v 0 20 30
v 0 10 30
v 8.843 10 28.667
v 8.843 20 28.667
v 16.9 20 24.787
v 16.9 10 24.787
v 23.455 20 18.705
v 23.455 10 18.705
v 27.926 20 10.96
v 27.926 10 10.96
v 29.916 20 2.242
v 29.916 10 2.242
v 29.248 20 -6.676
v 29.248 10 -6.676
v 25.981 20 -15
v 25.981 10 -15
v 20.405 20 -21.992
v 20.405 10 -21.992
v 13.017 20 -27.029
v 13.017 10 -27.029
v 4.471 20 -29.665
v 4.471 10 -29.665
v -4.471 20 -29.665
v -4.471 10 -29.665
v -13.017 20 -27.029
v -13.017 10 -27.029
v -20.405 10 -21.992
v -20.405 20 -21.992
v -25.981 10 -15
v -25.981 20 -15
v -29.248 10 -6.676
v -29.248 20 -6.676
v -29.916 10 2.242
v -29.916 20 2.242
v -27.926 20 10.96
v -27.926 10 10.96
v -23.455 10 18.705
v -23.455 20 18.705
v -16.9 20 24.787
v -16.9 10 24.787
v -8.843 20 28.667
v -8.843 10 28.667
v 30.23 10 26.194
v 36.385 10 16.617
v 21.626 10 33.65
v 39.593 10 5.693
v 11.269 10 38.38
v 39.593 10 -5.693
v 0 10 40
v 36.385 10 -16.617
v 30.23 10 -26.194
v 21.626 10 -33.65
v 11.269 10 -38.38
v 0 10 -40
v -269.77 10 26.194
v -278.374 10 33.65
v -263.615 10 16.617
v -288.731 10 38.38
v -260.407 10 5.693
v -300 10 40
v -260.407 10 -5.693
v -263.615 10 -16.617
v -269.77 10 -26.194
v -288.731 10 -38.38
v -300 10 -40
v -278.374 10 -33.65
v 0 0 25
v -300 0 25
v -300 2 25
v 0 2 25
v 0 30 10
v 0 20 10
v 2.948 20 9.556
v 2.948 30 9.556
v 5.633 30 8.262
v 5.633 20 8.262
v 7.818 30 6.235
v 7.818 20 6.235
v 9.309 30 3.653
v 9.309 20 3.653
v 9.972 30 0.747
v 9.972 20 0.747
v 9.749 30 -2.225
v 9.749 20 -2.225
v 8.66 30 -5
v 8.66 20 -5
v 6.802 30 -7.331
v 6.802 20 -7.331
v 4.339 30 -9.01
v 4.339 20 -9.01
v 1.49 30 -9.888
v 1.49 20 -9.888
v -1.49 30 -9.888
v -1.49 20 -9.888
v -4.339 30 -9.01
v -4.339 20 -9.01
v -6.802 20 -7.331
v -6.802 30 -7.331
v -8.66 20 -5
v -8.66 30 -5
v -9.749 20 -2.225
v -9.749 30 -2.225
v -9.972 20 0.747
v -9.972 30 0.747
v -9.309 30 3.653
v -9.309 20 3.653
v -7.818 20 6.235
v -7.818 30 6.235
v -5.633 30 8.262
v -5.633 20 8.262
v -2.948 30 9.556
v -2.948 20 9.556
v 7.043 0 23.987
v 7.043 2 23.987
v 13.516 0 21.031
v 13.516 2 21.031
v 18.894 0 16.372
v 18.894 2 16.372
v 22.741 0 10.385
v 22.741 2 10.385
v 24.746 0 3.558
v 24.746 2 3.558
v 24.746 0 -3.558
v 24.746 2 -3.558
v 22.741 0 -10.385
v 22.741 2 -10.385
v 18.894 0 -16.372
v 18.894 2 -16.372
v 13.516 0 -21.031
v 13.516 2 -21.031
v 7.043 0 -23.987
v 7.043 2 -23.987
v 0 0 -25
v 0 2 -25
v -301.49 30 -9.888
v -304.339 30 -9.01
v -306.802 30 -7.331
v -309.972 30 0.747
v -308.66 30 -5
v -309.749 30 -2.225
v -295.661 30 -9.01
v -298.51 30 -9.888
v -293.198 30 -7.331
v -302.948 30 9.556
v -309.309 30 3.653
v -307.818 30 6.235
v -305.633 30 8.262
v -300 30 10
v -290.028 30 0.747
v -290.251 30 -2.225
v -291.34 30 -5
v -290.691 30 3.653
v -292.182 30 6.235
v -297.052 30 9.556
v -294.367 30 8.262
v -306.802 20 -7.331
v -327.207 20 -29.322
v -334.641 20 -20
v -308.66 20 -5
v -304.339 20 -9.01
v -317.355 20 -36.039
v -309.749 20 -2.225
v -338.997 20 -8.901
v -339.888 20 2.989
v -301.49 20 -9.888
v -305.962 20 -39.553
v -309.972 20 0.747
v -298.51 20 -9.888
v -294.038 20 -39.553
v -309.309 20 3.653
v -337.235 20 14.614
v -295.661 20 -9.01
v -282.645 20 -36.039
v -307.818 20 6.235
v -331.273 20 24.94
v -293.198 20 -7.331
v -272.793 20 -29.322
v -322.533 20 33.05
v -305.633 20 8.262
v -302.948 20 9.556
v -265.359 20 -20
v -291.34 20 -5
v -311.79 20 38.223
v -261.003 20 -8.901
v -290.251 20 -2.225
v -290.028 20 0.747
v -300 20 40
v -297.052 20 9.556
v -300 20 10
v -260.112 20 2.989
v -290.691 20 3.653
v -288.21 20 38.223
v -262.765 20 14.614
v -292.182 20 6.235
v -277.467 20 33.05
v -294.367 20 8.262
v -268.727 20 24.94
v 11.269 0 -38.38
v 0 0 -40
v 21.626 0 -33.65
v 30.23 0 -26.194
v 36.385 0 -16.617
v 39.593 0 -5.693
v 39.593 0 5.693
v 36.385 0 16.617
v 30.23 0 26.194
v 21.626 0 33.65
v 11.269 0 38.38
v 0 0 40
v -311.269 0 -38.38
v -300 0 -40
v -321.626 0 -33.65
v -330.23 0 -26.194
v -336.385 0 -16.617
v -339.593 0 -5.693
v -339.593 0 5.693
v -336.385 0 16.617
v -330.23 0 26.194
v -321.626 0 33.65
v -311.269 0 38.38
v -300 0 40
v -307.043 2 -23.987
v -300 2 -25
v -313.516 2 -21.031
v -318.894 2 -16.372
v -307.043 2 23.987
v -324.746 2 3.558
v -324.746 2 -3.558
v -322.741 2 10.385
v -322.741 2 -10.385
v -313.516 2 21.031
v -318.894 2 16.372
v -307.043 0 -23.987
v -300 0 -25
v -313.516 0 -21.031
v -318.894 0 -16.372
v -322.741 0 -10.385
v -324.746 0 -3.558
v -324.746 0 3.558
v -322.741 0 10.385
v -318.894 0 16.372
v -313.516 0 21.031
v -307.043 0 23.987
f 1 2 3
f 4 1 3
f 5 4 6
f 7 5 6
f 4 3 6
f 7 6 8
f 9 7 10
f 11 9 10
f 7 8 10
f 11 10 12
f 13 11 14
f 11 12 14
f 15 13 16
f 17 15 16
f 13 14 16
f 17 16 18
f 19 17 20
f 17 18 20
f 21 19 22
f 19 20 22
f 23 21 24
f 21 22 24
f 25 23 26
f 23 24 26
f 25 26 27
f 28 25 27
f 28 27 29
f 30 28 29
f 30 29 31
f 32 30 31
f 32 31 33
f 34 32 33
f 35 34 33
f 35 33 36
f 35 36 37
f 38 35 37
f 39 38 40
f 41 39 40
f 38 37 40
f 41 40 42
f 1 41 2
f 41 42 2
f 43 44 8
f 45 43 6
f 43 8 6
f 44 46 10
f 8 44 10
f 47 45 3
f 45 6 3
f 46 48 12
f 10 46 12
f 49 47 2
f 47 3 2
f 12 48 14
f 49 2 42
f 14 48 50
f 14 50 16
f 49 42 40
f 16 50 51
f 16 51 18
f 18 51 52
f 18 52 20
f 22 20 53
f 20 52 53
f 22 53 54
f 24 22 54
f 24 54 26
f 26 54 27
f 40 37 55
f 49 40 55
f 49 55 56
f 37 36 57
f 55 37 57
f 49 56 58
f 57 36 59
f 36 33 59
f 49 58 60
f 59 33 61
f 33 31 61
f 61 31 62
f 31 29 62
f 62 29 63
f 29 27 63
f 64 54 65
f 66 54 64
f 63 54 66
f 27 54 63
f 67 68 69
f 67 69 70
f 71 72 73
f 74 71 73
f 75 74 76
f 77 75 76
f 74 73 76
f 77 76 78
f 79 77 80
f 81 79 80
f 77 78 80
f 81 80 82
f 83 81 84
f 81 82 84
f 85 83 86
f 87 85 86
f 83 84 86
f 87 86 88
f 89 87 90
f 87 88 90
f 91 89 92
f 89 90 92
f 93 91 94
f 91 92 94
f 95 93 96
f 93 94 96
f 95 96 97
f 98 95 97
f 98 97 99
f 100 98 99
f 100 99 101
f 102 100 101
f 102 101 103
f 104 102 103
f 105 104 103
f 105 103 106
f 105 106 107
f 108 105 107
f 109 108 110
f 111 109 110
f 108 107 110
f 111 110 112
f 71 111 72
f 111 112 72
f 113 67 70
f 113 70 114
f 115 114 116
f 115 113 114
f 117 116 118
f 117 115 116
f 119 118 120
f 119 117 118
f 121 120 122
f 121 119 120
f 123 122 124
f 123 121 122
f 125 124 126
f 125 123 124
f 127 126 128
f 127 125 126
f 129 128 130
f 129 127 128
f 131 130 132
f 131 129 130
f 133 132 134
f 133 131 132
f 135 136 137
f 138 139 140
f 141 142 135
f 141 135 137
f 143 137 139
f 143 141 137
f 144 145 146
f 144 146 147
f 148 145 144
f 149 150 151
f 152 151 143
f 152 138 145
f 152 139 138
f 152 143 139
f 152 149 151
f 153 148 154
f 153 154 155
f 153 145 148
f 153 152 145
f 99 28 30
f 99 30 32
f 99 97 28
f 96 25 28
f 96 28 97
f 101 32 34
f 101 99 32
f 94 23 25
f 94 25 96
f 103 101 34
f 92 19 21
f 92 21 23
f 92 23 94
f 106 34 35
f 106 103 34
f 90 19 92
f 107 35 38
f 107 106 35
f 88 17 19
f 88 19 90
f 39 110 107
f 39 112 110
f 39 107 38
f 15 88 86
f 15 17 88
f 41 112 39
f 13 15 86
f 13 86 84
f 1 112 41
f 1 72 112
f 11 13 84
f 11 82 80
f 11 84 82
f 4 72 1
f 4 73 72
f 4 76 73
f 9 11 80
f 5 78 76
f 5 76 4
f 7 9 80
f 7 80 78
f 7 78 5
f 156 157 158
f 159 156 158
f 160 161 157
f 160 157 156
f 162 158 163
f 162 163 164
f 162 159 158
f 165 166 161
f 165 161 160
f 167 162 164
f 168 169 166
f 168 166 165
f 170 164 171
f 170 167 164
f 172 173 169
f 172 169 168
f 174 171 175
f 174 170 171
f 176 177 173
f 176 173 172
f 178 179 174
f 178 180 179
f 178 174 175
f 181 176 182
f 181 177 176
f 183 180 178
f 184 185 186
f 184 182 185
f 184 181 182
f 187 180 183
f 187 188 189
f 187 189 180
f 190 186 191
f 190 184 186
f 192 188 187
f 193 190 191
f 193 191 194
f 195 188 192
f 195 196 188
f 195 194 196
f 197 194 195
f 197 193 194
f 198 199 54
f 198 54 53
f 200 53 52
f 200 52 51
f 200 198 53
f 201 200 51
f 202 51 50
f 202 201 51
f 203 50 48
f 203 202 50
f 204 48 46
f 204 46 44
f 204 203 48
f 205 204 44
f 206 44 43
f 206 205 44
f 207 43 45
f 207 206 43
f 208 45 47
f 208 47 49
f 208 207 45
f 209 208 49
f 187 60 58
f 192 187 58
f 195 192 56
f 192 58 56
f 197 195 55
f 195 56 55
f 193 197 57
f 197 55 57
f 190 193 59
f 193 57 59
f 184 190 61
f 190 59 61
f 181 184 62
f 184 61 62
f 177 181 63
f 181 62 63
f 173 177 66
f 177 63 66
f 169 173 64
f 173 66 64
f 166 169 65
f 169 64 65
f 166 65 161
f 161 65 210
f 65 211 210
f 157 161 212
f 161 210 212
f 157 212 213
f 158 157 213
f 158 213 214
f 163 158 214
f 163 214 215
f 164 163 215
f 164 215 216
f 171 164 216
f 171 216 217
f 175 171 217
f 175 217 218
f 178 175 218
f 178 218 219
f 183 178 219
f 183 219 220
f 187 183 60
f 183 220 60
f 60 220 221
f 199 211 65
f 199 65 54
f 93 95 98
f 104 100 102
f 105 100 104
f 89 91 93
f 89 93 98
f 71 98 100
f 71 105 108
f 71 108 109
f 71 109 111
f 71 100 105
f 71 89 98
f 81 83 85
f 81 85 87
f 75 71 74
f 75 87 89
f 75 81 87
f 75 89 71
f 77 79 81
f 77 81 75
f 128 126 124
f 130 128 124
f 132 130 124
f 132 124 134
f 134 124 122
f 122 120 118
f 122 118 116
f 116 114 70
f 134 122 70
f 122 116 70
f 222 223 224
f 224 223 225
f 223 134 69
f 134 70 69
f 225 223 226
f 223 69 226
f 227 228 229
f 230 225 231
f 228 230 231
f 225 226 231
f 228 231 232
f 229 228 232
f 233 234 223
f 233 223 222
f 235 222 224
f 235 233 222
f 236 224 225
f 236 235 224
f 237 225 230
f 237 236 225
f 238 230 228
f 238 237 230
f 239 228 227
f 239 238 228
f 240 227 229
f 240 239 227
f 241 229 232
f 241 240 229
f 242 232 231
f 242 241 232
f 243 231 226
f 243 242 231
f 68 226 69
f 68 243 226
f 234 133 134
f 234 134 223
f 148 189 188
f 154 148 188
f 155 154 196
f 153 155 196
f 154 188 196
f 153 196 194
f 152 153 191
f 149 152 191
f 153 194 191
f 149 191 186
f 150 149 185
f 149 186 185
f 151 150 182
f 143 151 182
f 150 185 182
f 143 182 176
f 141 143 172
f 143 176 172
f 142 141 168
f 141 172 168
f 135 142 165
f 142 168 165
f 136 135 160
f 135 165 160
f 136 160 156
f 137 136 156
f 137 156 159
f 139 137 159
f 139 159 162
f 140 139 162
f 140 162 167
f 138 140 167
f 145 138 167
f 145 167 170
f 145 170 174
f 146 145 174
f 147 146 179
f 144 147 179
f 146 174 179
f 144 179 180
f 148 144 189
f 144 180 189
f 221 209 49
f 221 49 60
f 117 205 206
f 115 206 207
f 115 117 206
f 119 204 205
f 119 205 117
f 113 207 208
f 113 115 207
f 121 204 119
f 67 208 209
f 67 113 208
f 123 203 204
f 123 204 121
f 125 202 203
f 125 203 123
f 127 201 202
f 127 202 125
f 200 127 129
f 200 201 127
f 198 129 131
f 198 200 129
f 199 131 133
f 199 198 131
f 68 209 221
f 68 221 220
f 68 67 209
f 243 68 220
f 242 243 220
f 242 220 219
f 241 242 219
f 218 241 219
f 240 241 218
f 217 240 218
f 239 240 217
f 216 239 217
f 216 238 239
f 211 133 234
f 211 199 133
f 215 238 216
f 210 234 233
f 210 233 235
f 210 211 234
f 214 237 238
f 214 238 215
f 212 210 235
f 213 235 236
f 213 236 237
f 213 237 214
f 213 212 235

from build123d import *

# Parameters (mm, degrees)
BOSS_EXTRUDE1_DEPTH = 10
SKETCH2_R           = 40
SKETCH2_R_2         = 30
BOSS_EXTRUDE2_DEPTH = 10
SKETCH3_R           = 10
BOSS_EXTRUDE3_DEPTH = 10
CUT_EXTRUDE1_DEPTH  = 2


with BuildPart() as part:
    # Sketch1 → Boss-Extrude1 (new body)
    with BuildSketch(Plane(origin=(0, 0, 0), x_dir=(1, 0, 0), z_dir=(0, 1, 0))):
        with BuildLine():
            Line((-300, 40), (0, 40))
            ThreePointArc((0, 40), (40, 0), (0, -40))
            Line((0, -40), (-300, -40))
            ThreePointArc((-300, -40), (-340, 0), (-300, 40))
        make_face()
    extrude(amount=BOSS_EXTRUDE1_DEPTH)

    # Sketch2 → Boss-Extrude2 (add)
    with BuildSketch(Plane(origin=(0, 10, 0), x_dir=(1, 0, 0), z_dir=(0, 1, 0))):
        with Locations(Location((-300, 0, 0), (0, 0, 270))):
            Circle(SKETCH2_R)
        with Locations(Location((0, 0, 0), (0, 0, 270))):
            Circle(SKETCH2_R_2)
    extrude(amount=BOSS_EXTRUDE2_DEPTH)

    # Sketch3 → Boss-Extrude3 (add)
    with BuildSketch(Plane(origin=(0, 20, 0), x_dir=(1, 0, 0), z_dir=(0, 1, 0))):
        with Locations(Location((0, 0, 0), (0, 0, 270))):
            Circle(SKETCH3_R)
        with Locations(Location((-300, 0, 0), (0, 0, 270))):
            Circle(SKETCH3_R)
    extrude(amount=BOSS_EXTRUDE3_DEPTH)

    # Sketch5 → Cut-Extrude1 (cut)
    with BuildSketch(Plane.XZ):
        with BuildLine():
            Line((-300, 25), (0, 25))
            ThreePointArc((0, 25), (25, 0), (0, -25))
            Line((0, -25), (-300, -25))
            ThreePointArc((-300, -25), (-325, 0), (-300, 25))
        make_face()
    extrude(amount=-CUT_EXTRUDE1_DEPTH, mode=Mode.SUBTRACT)


solid = part.part
